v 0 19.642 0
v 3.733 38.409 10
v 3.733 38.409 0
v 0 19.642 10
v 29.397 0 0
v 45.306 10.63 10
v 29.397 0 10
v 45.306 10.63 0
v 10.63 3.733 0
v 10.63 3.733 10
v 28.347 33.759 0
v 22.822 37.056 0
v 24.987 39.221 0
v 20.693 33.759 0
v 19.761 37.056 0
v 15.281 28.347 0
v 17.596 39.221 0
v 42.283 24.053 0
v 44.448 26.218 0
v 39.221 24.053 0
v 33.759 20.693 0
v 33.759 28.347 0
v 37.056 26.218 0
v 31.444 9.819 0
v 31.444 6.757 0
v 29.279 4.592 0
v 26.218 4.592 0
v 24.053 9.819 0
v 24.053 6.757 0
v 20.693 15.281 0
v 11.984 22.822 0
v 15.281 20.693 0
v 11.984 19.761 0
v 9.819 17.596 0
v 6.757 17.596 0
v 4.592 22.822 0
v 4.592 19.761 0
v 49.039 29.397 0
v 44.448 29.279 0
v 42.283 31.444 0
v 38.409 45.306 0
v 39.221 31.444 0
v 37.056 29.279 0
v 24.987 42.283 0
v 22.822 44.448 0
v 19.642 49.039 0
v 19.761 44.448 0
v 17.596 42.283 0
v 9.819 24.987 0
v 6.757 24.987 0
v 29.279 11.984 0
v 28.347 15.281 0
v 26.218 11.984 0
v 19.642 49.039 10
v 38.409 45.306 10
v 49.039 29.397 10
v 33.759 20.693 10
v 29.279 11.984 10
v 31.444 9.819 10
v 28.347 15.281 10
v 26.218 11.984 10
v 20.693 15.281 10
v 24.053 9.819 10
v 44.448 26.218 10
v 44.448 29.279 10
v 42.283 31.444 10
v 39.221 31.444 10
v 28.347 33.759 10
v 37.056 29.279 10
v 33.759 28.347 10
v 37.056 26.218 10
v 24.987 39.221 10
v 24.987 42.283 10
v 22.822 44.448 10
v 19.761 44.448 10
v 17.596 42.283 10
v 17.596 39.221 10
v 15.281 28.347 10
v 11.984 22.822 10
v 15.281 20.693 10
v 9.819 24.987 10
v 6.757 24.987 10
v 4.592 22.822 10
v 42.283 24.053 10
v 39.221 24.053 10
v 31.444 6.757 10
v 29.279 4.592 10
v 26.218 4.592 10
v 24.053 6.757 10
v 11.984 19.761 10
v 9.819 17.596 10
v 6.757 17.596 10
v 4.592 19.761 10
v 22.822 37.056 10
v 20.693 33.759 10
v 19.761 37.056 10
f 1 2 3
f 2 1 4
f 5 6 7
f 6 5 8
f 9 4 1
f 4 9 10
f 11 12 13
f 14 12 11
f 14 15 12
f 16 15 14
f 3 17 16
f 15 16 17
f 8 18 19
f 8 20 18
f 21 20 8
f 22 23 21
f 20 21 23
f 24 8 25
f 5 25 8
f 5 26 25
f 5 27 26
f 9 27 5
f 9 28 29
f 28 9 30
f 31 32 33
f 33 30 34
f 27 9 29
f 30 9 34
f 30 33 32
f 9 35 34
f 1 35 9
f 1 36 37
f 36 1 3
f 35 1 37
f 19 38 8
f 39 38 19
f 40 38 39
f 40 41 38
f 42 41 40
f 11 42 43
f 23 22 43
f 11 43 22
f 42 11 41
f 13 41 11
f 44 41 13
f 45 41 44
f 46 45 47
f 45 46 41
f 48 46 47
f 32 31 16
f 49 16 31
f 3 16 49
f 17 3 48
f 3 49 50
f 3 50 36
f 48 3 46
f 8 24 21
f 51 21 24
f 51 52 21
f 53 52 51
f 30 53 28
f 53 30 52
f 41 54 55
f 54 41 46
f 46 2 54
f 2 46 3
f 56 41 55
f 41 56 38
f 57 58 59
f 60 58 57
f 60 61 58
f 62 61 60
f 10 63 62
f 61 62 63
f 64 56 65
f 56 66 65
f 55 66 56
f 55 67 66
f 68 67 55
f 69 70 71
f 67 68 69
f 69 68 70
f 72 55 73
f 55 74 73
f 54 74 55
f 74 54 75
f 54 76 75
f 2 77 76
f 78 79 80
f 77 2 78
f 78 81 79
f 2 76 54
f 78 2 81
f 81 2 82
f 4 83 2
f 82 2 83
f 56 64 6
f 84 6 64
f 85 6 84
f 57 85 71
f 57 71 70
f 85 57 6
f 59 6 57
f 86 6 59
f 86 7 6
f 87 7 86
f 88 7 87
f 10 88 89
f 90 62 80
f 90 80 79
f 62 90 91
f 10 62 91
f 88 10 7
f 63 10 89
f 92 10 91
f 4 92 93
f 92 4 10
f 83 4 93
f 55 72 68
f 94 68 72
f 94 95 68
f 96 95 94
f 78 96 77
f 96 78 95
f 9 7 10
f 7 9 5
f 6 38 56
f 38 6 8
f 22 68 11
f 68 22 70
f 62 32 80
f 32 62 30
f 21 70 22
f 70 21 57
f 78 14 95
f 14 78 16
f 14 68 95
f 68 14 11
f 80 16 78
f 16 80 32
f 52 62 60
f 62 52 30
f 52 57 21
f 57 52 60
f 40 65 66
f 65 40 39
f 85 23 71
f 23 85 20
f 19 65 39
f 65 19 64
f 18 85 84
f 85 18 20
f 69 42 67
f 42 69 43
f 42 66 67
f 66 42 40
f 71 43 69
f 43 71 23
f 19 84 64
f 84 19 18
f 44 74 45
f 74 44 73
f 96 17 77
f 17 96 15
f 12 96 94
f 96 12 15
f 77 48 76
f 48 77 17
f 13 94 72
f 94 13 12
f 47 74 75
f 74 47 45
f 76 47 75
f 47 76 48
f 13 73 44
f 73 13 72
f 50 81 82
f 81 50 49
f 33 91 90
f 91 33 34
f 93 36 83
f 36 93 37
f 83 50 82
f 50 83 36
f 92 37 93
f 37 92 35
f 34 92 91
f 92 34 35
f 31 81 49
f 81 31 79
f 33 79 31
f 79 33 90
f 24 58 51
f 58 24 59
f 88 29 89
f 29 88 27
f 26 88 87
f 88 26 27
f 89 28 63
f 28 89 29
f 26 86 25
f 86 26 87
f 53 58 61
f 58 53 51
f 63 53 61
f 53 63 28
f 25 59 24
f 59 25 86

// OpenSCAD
$fn = 32;

// ----------------------------------------------------------------------
// Polygon plate: 8-gon R25, 4 bolt windows
// ----------------------------------------------------------------------

// --- parameters (mm) ---
sides = 8;                // number of polygon sides
plate_r = 25;             // circumscribed radius of the polygon
bore_r = 10;              // centre bore radius
bolts = 4;                // number of bolt windows
ring_r = 16.55;           // bolt-circle radius
bolt_r = 4;               // bolt window radius
plate_t = 10;             // plate thickness, Z (extrusion height)

plate_d = 2 * plate_r;  // circumscribed diameter
bore_d = 2 * bore_r;  // centre bore diameter
bolt_d = 2 * bolt_r;  // bolt window diameter
ring_d = 2 * ring_r;  // bolt-circle diameter

profile = [[49.039, 29.397], [38.409, 45.306], [19.642, 49.039], [3.733, 38.409], [0, 19.642], [10.63, 3.733], [29.397, 0], [45.306, 10.63]];  // primary outline, 8 points, counter clockwise
void_1 = [[33.759, 28.347], [28.347, 33.759], [20.693, 33.759], [15.281, 28.347], [15.281, 20.693], [20.693, 15.281], [28.347, 15.281], [33.759, 20.693]];  // centre bore, 8 points
void_2 = [[44.448, 29.279], [42.283, 31.444], [39.221, 31.444], [37.056, 29.279], [37.056, 26.218], [39.221, 24.053], [42.283, 24.053], [44.448, 26.218]];  // bolt window 1, 8 points
void_3 = [[24.987, 42.283], [22.822, 44.448], [19.761, 44.448], [17.596, 42.283], [17.596, 39.221], [19.761, 37.056], [22.822, 37.056], [24.987, 39.221]];  // bolt window 2, 8 points
void_4 = [[11.984, 22.822], [9.819, 24.987], [6.757, 24.987], [4.592, 22.822], [4.592, 19.761], [6.757, 17.596], [9.819, 17.596], [11.984, 19.761]];  // bolt window 3, 8 points
void_5 = [[31.444, 9.819], [29.279, 11.984], [26.218, 11.984], [24.053, 9.819], [24.053, 6.757], [26.218, 4.592], [29.279, 4.592], [31.444, 6.757]];  // bolt window 4, 8 points

// --- the one profile operation ---
difference() {
  linear_extrude(height = plate_t) polygon(points = profile);
  translate([0, 0, -1])
    linear_extrude(height = plate_t + 2) polygon(points = void_1);
  translate([0, 0, -1])
    linear_extrude(height = plate_t + 2) polygon(points = void_2);
  translate([0, 0, -1])
    linear_extrude(height = plate_t + 2) polygon(points = void_3);
  translate([0, 0, -1])
    linear_extrude(height = plate_t + 2) polygon(points = void_4);
  translate([0, 0, -1])
    linear_extrude(height = plate_t + 2) polygon(points = void_5);
}
